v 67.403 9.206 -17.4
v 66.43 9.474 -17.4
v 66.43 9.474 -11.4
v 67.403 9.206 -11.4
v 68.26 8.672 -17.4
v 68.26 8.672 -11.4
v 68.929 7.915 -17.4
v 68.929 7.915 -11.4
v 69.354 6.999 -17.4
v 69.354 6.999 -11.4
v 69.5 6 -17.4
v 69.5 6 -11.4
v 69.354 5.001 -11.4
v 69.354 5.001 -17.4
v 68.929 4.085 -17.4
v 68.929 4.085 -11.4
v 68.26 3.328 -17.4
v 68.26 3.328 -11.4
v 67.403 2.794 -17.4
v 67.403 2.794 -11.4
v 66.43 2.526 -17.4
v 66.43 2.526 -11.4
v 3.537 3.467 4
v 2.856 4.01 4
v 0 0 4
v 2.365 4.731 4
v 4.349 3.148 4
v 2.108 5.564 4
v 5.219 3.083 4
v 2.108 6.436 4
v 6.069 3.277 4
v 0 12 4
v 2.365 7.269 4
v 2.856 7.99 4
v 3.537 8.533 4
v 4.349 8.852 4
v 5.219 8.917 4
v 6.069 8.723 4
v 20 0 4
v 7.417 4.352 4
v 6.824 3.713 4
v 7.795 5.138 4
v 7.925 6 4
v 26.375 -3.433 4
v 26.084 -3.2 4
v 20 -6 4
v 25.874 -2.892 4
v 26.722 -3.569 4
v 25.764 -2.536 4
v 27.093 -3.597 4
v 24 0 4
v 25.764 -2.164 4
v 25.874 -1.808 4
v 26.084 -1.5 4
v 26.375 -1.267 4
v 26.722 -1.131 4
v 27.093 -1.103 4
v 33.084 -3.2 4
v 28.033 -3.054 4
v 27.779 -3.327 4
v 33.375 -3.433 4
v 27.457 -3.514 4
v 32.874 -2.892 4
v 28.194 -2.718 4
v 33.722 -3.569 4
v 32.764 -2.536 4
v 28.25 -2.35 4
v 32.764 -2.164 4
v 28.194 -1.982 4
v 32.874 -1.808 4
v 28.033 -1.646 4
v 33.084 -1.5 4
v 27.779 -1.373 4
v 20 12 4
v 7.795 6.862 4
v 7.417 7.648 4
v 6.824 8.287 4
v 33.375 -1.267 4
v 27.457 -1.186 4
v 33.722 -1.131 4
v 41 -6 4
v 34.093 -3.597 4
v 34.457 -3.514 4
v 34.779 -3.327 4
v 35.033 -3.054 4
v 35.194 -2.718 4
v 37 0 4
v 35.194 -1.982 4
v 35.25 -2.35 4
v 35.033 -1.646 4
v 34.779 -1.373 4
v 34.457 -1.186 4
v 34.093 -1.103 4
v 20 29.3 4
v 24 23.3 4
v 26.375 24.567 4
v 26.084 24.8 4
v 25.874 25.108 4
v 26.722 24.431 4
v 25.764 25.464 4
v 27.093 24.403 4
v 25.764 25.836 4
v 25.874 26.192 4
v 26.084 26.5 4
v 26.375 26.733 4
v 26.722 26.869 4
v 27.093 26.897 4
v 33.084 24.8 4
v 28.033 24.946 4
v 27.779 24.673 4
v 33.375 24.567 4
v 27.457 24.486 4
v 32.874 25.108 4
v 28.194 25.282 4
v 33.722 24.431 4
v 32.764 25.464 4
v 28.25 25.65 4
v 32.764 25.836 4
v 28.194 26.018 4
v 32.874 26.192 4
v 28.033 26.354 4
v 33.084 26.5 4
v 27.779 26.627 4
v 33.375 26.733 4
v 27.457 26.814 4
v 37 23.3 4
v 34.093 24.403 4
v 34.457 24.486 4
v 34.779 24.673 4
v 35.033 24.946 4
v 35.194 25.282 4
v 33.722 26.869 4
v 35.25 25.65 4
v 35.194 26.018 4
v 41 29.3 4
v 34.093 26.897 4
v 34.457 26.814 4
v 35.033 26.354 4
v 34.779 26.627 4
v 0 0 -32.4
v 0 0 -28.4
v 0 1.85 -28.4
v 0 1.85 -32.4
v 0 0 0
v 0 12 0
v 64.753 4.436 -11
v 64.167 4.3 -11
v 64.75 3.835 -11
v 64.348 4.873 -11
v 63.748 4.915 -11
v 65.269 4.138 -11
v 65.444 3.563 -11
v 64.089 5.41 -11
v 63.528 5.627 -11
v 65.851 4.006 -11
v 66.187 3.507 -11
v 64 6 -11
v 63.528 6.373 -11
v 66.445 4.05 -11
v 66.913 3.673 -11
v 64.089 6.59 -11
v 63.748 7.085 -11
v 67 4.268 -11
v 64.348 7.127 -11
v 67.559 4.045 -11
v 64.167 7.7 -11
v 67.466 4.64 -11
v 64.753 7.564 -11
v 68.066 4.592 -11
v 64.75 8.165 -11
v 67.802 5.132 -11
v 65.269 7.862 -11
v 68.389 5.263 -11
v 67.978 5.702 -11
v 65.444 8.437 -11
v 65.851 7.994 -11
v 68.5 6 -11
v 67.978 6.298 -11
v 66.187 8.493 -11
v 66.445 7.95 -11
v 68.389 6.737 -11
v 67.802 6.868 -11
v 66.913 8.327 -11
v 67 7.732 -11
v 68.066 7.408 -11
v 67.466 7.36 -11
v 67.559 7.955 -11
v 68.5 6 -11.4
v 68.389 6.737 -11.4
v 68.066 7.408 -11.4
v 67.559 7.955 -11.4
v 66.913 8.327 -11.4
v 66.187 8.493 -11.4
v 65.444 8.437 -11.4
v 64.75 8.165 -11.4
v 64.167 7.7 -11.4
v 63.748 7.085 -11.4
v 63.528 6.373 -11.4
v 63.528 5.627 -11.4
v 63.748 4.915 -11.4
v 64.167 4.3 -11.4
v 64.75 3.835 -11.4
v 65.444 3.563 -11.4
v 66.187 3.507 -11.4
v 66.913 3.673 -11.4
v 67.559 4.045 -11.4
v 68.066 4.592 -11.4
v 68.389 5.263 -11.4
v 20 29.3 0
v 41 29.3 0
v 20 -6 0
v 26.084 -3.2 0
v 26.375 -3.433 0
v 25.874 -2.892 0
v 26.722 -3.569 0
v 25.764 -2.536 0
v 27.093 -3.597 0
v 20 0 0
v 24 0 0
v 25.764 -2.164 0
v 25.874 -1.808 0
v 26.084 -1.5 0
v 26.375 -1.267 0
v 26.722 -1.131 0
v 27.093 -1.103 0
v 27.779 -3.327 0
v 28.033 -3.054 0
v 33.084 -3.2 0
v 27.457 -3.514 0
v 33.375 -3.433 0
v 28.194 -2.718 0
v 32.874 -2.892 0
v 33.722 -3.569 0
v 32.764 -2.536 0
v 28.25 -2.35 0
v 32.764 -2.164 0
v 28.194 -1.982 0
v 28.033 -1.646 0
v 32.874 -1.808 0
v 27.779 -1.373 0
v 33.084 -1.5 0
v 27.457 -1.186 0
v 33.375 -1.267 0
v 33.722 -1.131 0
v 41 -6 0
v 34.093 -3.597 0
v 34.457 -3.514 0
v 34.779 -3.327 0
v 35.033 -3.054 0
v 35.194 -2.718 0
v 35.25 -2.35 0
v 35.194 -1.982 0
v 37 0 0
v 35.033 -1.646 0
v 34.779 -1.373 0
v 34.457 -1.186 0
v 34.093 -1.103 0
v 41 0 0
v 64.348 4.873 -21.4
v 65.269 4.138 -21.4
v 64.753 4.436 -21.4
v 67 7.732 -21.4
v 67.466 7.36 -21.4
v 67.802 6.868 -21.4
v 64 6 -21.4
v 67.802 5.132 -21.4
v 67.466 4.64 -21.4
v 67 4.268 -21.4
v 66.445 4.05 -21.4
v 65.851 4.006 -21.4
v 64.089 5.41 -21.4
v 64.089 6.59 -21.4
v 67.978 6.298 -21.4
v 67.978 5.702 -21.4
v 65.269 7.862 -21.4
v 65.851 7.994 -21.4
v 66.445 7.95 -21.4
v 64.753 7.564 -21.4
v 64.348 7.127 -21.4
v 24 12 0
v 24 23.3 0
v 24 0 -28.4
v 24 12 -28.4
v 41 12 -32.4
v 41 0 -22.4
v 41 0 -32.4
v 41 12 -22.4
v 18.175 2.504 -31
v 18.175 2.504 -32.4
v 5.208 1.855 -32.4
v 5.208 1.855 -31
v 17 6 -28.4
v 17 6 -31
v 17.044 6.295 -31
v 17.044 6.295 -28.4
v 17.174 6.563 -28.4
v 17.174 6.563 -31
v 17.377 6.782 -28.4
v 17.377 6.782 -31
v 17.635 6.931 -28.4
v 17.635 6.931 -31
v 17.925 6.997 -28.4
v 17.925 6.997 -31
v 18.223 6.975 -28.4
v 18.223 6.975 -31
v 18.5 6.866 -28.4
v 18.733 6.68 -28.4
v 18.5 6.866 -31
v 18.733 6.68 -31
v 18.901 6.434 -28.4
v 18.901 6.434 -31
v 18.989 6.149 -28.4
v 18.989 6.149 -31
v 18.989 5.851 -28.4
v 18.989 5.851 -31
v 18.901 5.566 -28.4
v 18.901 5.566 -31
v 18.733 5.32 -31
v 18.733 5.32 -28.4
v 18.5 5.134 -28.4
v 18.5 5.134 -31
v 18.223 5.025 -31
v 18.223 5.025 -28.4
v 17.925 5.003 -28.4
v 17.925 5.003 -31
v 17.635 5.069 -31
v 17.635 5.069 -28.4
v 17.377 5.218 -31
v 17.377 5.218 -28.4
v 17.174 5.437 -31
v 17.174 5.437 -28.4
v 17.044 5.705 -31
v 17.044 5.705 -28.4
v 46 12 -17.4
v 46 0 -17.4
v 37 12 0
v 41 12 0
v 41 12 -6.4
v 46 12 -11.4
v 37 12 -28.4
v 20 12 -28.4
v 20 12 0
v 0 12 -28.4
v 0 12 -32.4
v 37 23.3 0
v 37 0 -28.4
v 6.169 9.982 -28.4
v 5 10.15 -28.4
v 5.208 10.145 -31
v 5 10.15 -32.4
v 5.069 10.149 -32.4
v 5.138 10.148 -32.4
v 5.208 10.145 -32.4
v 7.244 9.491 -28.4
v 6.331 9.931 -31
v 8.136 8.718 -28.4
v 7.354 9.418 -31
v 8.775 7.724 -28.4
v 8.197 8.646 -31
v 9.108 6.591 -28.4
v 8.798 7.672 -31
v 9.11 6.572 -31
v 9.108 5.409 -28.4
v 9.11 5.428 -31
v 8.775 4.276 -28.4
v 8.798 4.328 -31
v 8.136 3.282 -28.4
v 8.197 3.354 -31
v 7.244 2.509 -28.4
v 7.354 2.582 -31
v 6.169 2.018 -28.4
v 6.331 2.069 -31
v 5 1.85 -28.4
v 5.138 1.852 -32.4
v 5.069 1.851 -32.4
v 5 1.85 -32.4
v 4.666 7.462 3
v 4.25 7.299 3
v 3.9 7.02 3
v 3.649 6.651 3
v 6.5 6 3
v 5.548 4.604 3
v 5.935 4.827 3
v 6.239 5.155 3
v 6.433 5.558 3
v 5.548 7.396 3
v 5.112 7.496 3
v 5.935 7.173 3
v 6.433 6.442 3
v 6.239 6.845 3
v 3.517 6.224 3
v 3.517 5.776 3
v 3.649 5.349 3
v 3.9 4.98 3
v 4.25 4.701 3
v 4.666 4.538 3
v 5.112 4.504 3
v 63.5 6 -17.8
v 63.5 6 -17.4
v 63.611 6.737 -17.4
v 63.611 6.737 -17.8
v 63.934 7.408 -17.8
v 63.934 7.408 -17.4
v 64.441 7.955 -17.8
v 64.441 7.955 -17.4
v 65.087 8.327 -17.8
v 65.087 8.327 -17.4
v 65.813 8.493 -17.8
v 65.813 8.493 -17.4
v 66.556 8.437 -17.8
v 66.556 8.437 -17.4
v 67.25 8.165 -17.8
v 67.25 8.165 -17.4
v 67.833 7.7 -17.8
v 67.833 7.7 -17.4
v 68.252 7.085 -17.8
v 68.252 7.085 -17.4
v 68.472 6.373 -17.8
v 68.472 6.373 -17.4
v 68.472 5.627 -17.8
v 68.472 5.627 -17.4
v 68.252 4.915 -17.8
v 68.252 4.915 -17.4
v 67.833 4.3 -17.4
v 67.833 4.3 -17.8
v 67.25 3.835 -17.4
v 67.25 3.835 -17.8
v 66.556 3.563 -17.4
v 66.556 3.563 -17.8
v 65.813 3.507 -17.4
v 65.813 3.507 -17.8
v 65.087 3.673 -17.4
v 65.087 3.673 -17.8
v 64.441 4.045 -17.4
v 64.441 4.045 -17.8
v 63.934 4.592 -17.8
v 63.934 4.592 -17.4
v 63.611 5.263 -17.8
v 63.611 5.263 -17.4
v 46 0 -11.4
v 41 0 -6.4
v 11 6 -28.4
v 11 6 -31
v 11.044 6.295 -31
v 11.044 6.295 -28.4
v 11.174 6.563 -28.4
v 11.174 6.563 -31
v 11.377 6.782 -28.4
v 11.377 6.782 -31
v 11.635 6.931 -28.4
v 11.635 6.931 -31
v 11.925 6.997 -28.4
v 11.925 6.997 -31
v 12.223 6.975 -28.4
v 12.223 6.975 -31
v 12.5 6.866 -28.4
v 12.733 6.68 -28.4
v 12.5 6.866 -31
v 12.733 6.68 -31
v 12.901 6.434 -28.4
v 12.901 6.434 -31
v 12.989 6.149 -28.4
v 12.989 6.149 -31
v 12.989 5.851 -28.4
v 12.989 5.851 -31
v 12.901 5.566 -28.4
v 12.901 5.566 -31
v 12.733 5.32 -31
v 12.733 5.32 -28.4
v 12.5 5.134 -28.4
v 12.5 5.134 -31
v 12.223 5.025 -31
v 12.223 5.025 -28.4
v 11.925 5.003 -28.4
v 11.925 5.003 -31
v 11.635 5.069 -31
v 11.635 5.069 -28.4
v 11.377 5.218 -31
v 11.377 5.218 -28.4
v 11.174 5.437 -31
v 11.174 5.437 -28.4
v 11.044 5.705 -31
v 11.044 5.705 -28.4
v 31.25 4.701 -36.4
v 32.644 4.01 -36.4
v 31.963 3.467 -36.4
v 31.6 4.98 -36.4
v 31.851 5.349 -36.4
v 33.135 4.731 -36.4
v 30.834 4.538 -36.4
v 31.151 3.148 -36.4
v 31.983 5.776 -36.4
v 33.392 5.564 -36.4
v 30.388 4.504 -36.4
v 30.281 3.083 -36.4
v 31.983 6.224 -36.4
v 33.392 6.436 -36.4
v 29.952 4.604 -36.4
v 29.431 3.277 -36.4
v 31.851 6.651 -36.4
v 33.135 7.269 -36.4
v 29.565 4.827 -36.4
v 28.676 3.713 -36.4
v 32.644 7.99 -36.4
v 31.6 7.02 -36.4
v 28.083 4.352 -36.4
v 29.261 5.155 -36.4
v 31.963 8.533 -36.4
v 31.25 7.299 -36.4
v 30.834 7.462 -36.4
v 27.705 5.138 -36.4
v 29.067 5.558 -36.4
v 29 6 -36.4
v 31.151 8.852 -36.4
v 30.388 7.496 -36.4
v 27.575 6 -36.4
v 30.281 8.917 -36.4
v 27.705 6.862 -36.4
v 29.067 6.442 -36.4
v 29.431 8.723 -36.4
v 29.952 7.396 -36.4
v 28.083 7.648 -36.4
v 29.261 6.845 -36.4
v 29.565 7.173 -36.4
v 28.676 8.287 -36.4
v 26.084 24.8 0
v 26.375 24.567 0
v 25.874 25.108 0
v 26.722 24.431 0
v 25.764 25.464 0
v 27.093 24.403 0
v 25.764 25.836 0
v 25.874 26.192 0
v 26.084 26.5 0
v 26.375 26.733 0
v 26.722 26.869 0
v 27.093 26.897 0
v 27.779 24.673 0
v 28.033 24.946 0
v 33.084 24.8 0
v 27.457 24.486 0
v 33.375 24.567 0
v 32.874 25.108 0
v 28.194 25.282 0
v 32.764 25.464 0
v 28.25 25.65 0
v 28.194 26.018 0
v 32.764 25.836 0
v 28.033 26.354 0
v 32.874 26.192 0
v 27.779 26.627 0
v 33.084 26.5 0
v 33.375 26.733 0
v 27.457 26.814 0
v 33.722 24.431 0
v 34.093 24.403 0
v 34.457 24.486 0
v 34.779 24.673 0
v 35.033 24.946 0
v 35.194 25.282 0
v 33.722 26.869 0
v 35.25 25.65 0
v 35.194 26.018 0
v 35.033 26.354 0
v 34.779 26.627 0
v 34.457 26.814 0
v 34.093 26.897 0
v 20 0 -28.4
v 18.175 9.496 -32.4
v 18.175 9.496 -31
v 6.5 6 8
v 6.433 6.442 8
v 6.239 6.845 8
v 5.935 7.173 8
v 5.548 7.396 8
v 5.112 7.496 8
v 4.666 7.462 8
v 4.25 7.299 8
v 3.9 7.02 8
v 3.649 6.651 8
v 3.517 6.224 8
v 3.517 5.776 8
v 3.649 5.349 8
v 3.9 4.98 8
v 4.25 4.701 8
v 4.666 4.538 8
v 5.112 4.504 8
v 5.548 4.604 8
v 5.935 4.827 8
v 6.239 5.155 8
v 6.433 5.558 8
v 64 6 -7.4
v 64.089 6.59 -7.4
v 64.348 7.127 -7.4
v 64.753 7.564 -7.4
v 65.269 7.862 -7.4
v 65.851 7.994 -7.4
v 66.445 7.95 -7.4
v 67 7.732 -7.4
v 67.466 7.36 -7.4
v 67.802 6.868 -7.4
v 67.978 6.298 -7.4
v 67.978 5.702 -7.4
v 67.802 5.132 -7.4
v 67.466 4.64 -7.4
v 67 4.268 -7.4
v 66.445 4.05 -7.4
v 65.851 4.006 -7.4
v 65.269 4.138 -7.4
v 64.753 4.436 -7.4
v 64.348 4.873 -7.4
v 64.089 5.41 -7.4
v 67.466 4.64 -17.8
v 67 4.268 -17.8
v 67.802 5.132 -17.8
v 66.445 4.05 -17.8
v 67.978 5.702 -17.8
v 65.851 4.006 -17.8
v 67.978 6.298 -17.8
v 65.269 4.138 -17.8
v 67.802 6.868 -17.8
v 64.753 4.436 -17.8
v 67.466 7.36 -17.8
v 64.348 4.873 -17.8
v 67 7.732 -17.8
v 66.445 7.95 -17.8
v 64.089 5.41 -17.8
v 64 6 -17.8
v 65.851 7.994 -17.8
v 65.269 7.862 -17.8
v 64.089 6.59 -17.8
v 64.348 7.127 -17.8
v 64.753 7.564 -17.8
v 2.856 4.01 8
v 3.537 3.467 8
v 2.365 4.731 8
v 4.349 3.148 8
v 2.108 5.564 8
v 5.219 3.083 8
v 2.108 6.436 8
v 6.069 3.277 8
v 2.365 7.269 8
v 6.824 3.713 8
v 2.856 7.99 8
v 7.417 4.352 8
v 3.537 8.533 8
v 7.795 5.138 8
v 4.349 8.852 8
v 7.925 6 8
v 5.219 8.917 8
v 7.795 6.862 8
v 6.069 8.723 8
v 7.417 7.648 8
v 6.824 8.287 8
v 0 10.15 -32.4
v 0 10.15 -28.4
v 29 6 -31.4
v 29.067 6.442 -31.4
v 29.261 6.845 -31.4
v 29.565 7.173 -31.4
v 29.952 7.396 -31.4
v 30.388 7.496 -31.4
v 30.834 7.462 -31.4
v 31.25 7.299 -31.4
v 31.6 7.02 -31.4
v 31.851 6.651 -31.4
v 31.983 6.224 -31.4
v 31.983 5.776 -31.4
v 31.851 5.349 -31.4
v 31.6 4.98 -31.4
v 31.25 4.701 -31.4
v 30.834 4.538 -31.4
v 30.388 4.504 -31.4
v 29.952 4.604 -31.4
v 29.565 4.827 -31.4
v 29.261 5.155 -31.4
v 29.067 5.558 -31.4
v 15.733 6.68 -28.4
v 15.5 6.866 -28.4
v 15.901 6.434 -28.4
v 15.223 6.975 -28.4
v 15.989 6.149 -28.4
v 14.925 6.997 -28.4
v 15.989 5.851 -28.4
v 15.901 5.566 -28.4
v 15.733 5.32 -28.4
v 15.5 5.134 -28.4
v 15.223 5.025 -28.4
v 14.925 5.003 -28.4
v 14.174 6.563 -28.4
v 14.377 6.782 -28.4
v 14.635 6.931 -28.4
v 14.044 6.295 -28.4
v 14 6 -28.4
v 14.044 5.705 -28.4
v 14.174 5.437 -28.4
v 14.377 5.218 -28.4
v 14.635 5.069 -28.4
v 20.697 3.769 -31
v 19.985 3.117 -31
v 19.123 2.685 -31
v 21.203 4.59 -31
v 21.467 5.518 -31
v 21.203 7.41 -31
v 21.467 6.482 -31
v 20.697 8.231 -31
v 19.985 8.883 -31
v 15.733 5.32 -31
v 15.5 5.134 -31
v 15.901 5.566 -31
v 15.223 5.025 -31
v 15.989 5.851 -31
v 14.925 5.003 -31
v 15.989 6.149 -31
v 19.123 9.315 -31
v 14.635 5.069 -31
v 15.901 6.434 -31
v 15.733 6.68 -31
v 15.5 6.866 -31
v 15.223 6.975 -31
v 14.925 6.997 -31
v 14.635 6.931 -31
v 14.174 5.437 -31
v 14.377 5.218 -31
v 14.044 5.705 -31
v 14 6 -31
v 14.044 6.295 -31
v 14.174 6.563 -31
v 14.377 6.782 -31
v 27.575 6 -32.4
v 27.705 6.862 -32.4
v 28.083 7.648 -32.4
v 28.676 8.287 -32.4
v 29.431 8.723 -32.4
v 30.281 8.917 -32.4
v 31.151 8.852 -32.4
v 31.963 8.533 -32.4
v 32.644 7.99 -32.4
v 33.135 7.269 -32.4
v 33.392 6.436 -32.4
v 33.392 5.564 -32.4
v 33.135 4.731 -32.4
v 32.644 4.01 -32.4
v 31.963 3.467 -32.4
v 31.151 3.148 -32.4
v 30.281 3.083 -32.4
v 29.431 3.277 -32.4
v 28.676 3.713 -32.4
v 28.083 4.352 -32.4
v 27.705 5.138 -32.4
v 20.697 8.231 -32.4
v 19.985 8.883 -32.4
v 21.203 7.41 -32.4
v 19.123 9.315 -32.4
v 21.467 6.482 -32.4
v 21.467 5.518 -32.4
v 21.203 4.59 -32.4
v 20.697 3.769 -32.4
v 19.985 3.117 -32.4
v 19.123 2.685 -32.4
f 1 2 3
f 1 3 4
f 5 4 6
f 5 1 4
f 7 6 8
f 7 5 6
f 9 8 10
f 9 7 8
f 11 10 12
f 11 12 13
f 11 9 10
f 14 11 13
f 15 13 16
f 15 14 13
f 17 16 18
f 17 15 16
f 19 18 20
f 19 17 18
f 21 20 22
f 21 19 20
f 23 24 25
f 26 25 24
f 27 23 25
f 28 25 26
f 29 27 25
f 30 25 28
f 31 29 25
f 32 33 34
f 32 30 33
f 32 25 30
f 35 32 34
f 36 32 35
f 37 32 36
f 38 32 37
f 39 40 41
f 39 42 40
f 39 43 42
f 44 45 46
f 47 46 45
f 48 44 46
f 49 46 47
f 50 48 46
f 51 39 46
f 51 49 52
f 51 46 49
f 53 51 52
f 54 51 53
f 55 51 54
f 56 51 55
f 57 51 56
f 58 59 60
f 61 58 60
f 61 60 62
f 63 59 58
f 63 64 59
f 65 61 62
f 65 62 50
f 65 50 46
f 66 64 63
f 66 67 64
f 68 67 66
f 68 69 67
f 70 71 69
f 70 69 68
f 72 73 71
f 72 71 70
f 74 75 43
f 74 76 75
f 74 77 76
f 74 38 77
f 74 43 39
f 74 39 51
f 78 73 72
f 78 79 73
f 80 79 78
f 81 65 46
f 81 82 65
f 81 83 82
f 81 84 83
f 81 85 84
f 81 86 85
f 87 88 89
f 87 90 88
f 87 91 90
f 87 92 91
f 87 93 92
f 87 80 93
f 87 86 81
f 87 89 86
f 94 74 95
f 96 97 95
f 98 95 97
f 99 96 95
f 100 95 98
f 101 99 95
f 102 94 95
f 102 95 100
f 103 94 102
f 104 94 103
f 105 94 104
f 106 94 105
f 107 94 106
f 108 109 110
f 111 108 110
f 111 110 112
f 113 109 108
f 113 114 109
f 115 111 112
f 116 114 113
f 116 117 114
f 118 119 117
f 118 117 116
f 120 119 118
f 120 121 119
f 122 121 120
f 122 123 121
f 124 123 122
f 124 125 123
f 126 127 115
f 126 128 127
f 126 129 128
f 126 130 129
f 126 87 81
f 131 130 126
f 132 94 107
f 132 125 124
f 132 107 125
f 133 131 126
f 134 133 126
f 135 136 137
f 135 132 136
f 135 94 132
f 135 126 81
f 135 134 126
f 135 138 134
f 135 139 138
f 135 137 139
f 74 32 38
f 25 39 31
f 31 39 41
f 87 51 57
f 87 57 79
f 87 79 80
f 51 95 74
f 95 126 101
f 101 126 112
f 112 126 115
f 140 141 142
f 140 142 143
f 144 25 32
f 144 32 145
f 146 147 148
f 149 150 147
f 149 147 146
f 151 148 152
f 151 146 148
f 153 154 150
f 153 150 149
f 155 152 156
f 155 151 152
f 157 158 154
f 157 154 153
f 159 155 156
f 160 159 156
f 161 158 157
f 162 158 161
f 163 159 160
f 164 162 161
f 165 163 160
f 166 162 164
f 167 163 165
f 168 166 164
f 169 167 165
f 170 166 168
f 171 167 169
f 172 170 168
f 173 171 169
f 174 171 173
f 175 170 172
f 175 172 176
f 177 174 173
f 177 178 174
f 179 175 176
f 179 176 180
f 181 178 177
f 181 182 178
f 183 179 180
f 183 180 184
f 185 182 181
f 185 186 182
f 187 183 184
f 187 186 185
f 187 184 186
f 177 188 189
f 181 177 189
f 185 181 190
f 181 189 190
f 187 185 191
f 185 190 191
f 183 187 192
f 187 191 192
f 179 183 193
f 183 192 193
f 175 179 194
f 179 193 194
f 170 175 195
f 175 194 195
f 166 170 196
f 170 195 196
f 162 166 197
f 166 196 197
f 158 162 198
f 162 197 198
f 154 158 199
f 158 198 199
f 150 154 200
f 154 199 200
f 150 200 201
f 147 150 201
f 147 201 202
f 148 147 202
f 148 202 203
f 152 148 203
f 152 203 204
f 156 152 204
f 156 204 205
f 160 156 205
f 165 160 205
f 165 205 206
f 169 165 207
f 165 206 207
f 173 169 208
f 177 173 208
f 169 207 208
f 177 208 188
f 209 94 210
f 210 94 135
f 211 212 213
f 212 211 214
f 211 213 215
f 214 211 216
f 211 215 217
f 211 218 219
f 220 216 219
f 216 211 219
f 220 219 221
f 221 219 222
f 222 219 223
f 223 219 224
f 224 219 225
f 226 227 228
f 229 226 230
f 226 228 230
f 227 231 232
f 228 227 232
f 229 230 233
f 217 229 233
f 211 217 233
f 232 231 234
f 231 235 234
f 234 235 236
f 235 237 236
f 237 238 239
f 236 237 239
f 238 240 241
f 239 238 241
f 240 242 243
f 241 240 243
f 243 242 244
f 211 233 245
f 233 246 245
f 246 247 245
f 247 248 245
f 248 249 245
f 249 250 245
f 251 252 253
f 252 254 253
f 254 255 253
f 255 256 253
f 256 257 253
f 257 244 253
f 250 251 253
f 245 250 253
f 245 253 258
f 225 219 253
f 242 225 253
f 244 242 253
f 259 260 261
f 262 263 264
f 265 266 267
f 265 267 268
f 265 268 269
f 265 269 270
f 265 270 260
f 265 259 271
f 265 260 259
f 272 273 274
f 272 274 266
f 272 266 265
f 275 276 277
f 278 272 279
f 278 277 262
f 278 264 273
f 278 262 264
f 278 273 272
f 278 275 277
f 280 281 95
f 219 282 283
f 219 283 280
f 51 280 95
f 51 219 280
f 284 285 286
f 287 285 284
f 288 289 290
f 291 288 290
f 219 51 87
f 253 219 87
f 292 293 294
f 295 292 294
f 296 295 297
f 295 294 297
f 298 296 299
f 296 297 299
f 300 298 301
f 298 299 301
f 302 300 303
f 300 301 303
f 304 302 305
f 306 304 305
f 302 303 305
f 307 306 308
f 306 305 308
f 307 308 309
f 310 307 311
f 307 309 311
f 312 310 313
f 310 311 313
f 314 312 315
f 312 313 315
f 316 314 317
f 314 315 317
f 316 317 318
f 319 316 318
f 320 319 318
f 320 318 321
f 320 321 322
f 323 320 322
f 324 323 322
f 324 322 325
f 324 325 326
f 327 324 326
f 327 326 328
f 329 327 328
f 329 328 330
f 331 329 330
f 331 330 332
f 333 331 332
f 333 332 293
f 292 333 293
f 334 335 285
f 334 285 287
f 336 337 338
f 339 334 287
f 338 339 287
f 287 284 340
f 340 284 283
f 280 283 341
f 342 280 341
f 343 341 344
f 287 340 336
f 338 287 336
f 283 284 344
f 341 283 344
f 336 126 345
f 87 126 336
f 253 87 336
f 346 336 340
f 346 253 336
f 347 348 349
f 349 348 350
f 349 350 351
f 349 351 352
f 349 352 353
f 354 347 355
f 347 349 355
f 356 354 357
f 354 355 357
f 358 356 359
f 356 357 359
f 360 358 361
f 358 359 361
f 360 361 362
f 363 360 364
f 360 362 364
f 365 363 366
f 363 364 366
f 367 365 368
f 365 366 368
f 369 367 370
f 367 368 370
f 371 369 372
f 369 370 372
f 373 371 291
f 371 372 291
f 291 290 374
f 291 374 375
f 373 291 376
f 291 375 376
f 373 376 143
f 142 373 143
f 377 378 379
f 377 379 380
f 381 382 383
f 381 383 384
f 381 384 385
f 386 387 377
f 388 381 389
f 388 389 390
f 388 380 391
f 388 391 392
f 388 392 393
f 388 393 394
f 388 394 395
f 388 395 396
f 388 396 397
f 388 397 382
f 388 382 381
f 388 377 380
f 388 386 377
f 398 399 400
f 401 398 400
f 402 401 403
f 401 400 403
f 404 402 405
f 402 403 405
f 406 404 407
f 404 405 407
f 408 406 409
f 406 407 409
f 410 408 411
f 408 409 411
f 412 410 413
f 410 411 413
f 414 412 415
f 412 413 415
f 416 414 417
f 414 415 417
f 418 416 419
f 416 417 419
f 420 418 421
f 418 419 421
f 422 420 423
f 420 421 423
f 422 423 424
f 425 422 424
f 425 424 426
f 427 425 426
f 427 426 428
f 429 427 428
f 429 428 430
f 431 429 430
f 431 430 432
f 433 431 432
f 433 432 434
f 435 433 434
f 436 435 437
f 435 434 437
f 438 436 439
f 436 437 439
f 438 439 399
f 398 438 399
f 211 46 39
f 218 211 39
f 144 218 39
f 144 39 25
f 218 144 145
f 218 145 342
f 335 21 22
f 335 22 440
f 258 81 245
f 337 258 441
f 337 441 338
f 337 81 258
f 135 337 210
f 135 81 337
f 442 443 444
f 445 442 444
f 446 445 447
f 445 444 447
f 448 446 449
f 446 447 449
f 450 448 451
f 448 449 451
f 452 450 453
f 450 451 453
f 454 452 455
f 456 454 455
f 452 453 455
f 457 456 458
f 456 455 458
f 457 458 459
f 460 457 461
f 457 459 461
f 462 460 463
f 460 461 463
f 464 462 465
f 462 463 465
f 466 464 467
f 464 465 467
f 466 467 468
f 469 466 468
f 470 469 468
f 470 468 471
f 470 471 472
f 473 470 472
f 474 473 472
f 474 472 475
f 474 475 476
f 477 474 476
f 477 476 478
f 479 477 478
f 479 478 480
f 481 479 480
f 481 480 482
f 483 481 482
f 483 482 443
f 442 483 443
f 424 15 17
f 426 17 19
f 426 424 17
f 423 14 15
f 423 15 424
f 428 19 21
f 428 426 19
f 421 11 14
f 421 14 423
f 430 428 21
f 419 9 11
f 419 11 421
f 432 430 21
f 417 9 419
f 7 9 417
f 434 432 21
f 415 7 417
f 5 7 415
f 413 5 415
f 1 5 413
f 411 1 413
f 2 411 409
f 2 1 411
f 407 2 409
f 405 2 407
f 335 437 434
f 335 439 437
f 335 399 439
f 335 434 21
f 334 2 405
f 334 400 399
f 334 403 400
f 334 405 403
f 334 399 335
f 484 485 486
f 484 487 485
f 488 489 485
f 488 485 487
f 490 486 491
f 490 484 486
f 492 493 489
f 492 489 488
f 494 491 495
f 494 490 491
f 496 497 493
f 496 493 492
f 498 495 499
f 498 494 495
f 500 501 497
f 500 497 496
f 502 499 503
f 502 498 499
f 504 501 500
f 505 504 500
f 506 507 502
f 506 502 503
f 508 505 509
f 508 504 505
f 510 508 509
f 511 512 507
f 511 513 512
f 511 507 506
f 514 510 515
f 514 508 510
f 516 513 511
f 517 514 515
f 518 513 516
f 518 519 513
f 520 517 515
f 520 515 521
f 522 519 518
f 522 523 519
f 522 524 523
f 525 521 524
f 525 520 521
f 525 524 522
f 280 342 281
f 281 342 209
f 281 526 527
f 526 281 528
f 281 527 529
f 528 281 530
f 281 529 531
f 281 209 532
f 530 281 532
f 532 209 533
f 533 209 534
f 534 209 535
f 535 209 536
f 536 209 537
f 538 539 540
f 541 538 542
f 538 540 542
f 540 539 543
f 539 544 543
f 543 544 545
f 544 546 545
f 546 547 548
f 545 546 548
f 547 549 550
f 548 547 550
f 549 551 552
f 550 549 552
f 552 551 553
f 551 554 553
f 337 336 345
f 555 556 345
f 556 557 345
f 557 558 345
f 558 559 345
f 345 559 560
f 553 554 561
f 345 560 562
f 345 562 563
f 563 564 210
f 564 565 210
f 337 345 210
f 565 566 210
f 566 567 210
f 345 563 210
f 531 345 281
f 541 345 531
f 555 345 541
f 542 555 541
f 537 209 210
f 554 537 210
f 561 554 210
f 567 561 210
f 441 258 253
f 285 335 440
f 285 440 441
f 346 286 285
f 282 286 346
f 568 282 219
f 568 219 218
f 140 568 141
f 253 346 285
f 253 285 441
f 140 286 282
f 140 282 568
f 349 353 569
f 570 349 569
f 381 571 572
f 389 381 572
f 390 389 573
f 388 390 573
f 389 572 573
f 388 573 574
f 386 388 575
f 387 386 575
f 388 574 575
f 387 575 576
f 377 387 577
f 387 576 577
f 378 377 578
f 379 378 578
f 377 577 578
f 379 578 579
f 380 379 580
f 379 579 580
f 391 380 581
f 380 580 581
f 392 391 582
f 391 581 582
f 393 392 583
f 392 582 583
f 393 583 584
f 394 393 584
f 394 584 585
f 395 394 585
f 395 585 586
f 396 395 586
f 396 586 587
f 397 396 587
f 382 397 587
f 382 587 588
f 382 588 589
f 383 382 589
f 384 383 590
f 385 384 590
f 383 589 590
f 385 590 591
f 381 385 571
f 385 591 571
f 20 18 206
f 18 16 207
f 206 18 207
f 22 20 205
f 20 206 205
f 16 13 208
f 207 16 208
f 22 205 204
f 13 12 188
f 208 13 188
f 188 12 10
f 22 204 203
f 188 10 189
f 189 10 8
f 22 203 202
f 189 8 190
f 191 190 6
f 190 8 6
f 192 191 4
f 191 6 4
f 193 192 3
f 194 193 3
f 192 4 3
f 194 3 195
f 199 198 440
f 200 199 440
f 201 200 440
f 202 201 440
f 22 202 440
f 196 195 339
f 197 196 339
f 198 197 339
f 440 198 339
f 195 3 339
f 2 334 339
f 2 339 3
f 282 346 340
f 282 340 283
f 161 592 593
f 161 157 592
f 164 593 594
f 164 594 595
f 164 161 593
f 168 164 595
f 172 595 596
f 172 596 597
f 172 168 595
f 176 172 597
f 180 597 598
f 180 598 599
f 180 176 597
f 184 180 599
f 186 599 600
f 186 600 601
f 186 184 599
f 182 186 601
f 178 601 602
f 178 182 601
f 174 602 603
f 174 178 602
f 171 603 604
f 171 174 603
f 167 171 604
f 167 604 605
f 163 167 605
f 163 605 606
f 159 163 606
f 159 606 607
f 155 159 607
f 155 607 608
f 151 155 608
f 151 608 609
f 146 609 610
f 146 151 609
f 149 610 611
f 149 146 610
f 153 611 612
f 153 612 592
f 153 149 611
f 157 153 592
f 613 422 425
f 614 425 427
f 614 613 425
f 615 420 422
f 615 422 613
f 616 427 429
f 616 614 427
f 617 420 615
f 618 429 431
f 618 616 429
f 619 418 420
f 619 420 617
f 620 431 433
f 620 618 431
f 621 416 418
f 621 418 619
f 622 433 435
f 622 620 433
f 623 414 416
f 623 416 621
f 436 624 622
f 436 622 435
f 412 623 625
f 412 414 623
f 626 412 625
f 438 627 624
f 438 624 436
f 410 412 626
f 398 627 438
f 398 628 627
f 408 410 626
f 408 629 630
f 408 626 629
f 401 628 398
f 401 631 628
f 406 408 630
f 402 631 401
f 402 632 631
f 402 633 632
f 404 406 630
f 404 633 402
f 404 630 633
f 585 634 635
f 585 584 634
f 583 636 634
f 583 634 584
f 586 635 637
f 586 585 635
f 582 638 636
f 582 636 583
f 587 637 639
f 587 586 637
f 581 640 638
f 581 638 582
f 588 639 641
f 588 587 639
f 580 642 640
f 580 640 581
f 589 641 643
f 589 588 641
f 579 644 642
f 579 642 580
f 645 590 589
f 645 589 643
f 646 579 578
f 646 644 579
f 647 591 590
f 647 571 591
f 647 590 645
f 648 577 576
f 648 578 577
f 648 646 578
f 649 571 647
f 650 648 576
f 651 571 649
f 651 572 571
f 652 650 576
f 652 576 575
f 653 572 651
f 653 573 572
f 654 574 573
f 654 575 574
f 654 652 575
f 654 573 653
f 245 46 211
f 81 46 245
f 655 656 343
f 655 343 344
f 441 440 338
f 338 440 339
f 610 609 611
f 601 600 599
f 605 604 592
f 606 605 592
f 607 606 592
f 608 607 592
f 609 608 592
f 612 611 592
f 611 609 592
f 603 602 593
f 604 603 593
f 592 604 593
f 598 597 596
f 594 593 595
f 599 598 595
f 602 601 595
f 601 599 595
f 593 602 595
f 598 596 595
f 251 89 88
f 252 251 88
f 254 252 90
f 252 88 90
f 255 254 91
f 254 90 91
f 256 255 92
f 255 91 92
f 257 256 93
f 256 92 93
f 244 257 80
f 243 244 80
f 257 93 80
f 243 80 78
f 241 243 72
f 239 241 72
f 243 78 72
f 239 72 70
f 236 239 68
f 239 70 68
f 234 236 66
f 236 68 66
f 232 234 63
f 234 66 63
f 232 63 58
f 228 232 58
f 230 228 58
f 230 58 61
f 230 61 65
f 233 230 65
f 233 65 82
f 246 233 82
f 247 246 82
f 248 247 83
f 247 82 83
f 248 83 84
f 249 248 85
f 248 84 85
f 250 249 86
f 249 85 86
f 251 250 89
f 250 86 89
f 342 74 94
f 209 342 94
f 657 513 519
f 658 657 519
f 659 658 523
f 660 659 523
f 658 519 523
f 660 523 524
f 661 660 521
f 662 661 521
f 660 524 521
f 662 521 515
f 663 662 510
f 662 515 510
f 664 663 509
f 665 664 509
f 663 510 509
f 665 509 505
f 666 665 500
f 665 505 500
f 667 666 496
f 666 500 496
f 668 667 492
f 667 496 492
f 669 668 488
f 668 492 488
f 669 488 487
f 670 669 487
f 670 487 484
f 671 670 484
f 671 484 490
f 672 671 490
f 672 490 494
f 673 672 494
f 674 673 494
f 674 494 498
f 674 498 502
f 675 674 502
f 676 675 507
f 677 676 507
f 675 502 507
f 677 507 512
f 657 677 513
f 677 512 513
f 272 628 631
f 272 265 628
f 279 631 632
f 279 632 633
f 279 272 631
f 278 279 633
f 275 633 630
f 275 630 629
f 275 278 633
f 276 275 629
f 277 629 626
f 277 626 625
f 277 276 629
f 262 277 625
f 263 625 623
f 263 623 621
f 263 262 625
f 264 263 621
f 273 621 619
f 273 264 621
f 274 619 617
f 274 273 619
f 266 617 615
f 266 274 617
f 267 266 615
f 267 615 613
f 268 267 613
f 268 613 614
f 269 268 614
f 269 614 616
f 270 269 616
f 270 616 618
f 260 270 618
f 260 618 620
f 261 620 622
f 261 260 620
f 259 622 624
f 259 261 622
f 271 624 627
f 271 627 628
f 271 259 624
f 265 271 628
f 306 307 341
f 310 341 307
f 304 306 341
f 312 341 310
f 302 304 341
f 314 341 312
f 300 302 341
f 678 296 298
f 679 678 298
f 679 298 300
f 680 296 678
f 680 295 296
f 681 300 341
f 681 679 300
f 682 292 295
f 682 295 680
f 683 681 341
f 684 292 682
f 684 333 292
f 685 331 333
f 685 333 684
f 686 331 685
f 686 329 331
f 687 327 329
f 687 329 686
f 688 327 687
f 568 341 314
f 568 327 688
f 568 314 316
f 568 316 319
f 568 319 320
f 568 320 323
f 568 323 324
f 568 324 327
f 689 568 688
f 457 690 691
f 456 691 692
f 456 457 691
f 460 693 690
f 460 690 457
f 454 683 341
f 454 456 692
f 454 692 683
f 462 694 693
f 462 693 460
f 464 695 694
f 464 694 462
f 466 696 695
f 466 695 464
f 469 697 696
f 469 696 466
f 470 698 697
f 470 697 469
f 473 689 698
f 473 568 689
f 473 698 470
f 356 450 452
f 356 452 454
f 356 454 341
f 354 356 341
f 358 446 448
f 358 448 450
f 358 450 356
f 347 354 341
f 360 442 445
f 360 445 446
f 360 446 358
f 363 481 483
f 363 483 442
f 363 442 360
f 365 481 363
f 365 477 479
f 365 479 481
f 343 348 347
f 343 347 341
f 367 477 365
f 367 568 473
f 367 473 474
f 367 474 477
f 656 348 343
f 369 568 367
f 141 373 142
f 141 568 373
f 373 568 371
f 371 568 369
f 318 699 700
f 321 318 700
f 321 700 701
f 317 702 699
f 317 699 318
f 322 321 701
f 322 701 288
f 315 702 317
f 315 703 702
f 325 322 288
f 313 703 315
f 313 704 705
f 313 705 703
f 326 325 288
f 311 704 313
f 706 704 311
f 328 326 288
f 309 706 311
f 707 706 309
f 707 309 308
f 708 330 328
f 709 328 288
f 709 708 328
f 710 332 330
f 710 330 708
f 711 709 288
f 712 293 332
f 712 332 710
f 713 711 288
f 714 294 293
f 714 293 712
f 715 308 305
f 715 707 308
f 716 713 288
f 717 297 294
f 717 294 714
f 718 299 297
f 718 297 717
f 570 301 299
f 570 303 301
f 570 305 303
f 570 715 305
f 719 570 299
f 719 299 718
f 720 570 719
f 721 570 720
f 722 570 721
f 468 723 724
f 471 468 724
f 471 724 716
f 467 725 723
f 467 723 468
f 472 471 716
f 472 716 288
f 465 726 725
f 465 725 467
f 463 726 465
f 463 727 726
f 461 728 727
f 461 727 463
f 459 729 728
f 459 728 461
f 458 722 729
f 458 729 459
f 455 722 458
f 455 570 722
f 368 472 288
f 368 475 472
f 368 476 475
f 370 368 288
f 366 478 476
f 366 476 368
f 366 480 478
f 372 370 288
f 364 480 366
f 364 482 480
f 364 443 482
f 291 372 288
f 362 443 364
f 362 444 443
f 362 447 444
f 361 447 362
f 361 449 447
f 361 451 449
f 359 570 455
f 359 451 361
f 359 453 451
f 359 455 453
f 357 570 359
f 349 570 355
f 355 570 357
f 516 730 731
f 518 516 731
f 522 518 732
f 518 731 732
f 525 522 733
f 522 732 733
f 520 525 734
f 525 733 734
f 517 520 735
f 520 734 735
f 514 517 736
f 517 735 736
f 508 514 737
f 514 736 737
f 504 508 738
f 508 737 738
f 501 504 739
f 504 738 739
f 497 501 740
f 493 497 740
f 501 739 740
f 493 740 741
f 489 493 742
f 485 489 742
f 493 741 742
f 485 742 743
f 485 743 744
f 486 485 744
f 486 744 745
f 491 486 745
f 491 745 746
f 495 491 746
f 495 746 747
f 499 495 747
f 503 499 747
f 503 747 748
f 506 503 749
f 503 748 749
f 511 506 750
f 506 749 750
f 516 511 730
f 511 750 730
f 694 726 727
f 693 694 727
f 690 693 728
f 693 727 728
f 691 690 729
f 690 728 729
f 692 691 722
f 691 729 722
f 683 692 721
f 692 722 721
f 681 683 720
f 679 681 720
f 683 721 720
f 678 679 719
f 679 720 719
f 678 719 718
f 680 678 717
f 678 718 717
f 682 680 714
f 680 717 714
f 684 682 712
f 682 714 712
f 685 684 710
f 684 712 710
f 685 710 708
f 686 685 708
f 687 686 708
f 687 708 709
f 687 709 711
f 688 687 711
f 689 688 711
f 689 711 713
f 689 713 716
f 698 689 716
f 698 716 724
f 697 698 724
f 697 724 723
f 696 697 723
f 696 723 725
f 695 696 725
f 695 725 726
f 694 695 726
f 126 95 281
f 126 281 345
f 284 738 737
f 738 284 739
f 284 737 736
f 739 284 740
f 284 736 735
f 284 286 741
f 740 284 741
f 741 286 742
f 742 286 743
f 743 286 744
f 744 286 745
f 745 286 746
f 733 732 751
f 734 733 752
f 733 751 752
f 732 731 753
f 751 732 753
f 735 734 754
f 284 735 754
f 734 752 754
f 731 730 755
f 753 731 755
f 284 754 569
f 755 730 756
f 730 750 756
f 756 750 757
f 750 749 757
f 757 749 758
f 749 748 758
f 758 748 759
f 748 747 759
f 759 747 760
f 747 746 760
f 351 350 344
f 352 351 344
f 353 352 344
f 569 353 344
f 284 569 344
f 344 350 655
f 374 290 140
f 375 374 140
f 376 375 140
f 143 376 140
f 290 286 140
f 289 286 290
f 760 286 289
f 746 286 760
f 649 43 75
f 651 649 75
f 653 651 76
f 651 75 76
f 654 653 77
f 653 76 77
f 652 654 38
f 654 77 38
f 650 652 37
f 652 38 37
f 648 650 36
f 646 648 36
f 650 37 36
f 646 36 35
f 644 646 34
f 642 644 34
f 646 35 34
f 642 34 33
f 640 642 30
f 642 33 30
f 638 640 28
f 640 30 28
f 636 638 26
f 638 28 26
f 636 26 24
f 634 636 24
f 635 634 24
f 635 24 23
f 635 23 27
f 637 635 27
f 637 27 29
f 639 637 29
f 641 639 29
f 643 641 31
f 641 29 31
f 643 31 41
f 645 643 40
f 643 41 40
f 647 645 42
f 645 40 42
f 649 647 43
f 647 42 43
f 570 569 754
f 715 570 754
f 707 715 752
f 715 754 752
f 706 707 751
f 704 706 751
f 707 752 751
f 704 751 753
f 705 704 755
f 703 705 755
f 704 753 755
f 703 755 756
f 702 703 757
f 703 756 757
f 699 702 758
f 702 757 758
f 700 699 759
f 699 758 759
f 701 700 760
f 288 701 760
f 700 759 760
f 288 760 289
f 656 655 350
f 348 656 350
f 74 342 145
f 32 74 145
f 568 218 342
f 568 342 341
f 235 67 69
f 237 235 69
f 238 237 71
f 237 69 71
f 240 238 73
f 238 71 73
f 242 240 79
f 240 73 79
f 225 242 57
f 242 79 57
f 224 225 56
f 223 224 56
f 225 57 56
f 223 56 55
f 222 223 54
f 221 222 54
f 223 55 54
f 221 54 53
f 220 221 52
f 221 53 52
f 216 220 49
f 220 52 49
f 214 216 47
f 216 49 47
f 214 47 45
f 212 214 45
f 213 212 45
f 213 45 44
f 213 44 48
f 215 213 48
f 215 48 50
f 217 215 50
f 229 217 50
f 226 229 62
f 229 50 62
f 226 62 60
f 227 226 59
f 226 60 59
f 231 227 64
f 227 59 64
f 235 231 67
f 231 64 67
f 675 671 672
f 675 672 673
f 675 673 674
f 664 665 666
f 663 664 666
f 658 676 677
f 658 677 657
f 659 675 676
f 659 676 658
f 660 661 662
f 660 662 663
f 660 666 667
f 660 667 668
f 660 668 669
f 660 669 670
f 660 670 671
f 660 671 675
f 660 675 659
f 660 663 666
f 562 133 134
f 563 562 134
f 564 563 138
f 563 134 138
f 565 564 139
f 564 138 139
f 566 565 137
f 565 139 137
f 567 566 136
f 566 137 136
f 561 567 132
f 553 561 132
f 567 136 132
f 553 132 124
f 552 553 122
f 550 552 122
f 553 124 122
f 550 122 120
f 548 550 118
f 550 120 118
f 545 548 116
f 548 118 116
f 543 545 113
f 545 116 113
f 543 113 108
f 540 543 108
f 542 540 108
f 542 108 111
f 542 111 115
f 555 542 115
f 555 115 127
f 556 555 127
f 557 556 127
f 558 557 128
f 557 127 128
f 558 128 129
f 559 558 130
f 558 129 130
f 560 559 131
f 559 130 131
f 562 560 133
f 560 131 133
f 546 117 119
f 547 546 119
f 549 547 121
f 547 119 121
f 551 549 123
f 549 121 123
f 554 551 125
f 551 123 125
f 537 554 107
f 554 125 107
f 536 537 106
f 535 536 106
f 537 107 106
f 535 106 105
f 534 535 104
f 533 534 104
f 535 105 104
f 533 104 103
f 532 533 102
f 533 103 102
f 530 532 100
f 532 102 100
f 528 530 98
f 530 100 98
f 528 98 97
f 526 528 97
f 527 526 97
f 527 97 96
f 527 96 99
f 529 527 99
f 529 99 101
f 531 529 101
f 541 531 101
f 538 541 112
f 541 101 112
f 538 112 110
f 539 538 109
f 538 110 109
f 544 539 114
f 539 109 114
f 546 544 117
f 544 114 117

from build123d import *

# Parameters (mm, degrees)
EXTRUDE_1_DEPTH     = 12
SKETCH_2_W          = 21
SKETCH_2_H          = 35.3
SKETCH_2_R          = 1.25
SKETCH_2_W_2        = 13
SKETCH_2_H_2        = 23.3
EXTRUDE_2_DEPTH     = 4
EXTRUDE_START       = -18
EXTRUDE_3_DEPTH     = 3
CHAMFER_1_SIZE      = 5
EXTRUDE_START_2     = -3
SKETCH_4_R          = 2
EXTRUDE_4_DEPTH     = 7
CUT_EXTRUDE_1_DEPTH = 12
SKETCH_6_R          = 1
CUT_EXTRUDE_2_DEPTH = 1.4
SKETCH_6_3_R        = 1
CUT_EXTRUDE_3_DEPTH = 4
SKETCH_7_R          = 2.925
EXTRUDE_5_DEPTH     = 4
SKETCH_8_R          = 1.5
CUT_EXTRUDE_4_DEPTH = 5
SKETCH_9_R          = 2.925
EXTRUDE_6_DEPTH     = 4
SKETCH_10_R         = 1.5
CUT_EXTRUDE_5_DEPTH = 5
SKETCH_11_R         = 2.5
EXTRUDE_7_DEPTH     = 0.4
EXTRUDE_START_3     = 0.4
SKETCH_12_R         = 2.5
EXTRUDE_8_DEPTH     = 0.4


with BuildPart() as part:
    # 草图1 → 凸台-拉伸1 (new body)
    with BuildSketch(Plane(origin=(0, 0, 0), x_dir=(1, 0, 0), z_dir=(0, 1, 0))):
        Polygon((0, 0), (20, 0), (20, 28.4), (0, 28.4), (0, 32.4), (24, 32.4), (41, 32.4), (41, -4), (37, -4), (37, 28.4), (24, 28.4), (24, -4), (0, -4), align=None)
    extrude(amount=EXTRUDE_1_DEPTH)

    # 草图2 → 凸台-拉伸2 (add)
    with BuildSketch(Plane.XY.offset(4)):
        with Locations((30.5, 11.65)):
            Rectangle(SKETCH_2_W, SKETCH_2_H)
        with Locations((27, 25.65)):
            Circle(SKETCH_2_R, mode=Mode.SUBTRACT)
        with Locations((27, -2.35)):
            Circle(SKETCH_2_R, mode=Mode.SUBTRACT)
        with Locations((34, -2.35)):
            Circle(SKETCH_2_R, mode=Mode.SUBTRACT)
        with Locations((34, 25.65)):
            Circle(SKETCH_2_R, mode=Mode.SUBTRACT)
        with Locations((30.5, 11.65)):
            Rectangle(SKETCH_2_W_2, SKETCH_2_H_2, mode=Mode.SUBTRACT)
    extrude(amount=-EXTRUDE_2_DEPTH)

    # 草图3 → 凸台-拉伸3 (add, symmetric)
    with BuildSketch(Plane(origin=(0, 0, -32.4), x_dir=(-1, 0, 0), z_dir=(0, 0, -1)).offset(EXTRUDE_START)):
        with BuildLine():
            Line((-41, 12), (-46, 12))
            Line((-46, 12), (-66.429561848, 9.473539494))
            ThreePointArc((-66.429561848, 9.473539494), (-69.5, 6), (-66.429561848, 2.526460506))
            Line((-66.429561848, 2.526460506), (-46, 0))
            Line((-46, 0), (-41, 0))
            Line((-41, 0), (-41, 12))
        make_face()
    extrude(amount=EXTRUDE_3_DEPTH, both=True)

    # 倒角1
    chamfer_1_edges = [part.edges().sort_by_distance(p)[0] for p in [
        (41, 6, -17.4),
        (41, 6, -11.4),
    ]]
    chamfer(chamfer_1_edges, length=CHAMFER_1_SIZE)

    # 草图4 → 凸台-拉伸4 (add, symmetric)
    with BuildSketch(Plane(origin=(0, 0, -17.4), x_dir=(-1, 0, 0), z_dir=(0, 0, -1)).offset(EXTRUDE_START_2)):
        with Locations((-66, 6)):
            Circle(SKETCH_4_R)
    extrude(amount=EXTRUDE_4_DEPTH, both=True)

    # 草图5 → 切除-拉伸1 (cut)
    with BuildSketch(Plane(origin=(0, 0, -32.4), x_dir=(-1, 0, 0), z_dir=(0, 0, -1))):
        with BuildLine():
            Line((0, 1.85), (0, 10.15))
            Line((0, 10.15), (-5, 10.15))
            ThreePointArc((-5, 10.15), (-9.15, 6), (-5, 1.85))
            Line((-5, 1.85), (0, 1.85))
        make_face()
    extrude(amount=-CUT_EXTRUDE_1_DEPTH, mode=Mode.SUBTRACT)

    # 草图6 → 切除-拉伸2 (cut)
    with BuildSketch(Plane(origin=(0, 0, -32.4), x_dir=(-1, 0, 0), z_dir=(0, 0, -1))):
        with BuildLine():
            Line((-5.2075, 10.144809254), (-18.175, 9.495622262))
            ThreePointArc((-18.175, 9.495622262), (-21.5, 6), (-18.175, 2.504377738))
            Line((-18.175, 2.504377738), (-5.2075, 1.855190746))
            ThreePointArc((-5.2075, 1.855190746), (-9.15, 6), (-5.2075, 10.144809254))
        make_face()
        with Locations((-15, 6)):
            Circle(SKETCH_6_R, mode=Mode.SUBTRACT)
        with Locations((-12, 6)):
            Circle(SKETCH_6_R, mode=Mode.SUBTRACT)
        with Locations((-18, 6)):
            Circle(SKETCH_6_R, mode=Mode.SUBTRACT)
    extrude(amount=-CUT_EXTRUDE_2_DEPTH, mode=Mode.SUBTRACT)

    # 草图6<3> → 切除-拉伸3 (cut)
    with BuildSketch(Plane(origin=(0, 0, -32.4), x_dir=(-1, 0, 0), z_dir=(0, 0, -1))):
        with Locations((-15, 6)):
            Circle(SKETCH_6_3_R)
        with Locations((-12, 6)):
            Circle(SKETCH_6_3_R)
        with Locations((-18, 6)):
            Circle(SKETCH_6_3_R)
    extrude(amount=-CUT_EXTRUDE_3_DEPTH, mode=Mode.SUBTRACT)

    # 草图7 → 凸台-拉伸5 (add)
    with BuildSketch(Plane.XY.offset(4)):
        with Locations((5, 6)):
            Circle(SKETCH_7_R)
    extrude(amount=EXTRUDE_5_DEPTH)

    # 草图8 → 切除-拉伸4 (cut)
    with BuildSketch(Plane.XY.offset(8)):
        with Locations((5, 6)):
            Circle(SKETCH_8_R)
    extrude(amount=-CUT_EXTRUDE_4_DEPTH, mode=Mode.SUBTRACT)

    # 草图9 → 凸台-拉伸6 (add)
    with BuildSketch(Plane(origin=(0, 0, -32.4), x_dir=(-1, 0, 0), z_dir=(0, 0, -1))):
        with Locations((-30.5, 6)):
            Circle(SKETCH_9_R)
    extrude(amount=EXTRUDE_6_DEPTH)

    # 草图10 → 切除-拉伸5 (cut)
    with BuildSketch(Plane(origin=(0, 0, -36.4), x_dir=(-1, 0, 0), z_dir=(0, 0, -1))):
        with Locations((-30.5, 6)):
            Circle(SKETCH_10_R)
    extrude(amount=-CUT_EXTRUDE_5_DEPTH, mode=Mode.SUBTRACT)

    # 草图11 → 凸台-拉伸7 (add)
    with BuildSketch(Plane(origin=(0, 0, -17.4), x_dir=(-1, 0, 0), z_dir=(0, 0, -1))):
        with Locations((-66, 6)):
            Circle(SKETCH_11_R)
    extrude(amount=EXTRUDE_7_DEPTH)

    # 草图12 → 凸台-拉伸8 (add)
    with BuildSketch(Plane.XY.offset(-11.4).offset(EXTRUDE_START_3)):
        with Locations((66, 6)):
            Circle(SKETCH_12_R)
    extrude(amount=-EXTRUDE_8_DEPTH)


solid = part.part
